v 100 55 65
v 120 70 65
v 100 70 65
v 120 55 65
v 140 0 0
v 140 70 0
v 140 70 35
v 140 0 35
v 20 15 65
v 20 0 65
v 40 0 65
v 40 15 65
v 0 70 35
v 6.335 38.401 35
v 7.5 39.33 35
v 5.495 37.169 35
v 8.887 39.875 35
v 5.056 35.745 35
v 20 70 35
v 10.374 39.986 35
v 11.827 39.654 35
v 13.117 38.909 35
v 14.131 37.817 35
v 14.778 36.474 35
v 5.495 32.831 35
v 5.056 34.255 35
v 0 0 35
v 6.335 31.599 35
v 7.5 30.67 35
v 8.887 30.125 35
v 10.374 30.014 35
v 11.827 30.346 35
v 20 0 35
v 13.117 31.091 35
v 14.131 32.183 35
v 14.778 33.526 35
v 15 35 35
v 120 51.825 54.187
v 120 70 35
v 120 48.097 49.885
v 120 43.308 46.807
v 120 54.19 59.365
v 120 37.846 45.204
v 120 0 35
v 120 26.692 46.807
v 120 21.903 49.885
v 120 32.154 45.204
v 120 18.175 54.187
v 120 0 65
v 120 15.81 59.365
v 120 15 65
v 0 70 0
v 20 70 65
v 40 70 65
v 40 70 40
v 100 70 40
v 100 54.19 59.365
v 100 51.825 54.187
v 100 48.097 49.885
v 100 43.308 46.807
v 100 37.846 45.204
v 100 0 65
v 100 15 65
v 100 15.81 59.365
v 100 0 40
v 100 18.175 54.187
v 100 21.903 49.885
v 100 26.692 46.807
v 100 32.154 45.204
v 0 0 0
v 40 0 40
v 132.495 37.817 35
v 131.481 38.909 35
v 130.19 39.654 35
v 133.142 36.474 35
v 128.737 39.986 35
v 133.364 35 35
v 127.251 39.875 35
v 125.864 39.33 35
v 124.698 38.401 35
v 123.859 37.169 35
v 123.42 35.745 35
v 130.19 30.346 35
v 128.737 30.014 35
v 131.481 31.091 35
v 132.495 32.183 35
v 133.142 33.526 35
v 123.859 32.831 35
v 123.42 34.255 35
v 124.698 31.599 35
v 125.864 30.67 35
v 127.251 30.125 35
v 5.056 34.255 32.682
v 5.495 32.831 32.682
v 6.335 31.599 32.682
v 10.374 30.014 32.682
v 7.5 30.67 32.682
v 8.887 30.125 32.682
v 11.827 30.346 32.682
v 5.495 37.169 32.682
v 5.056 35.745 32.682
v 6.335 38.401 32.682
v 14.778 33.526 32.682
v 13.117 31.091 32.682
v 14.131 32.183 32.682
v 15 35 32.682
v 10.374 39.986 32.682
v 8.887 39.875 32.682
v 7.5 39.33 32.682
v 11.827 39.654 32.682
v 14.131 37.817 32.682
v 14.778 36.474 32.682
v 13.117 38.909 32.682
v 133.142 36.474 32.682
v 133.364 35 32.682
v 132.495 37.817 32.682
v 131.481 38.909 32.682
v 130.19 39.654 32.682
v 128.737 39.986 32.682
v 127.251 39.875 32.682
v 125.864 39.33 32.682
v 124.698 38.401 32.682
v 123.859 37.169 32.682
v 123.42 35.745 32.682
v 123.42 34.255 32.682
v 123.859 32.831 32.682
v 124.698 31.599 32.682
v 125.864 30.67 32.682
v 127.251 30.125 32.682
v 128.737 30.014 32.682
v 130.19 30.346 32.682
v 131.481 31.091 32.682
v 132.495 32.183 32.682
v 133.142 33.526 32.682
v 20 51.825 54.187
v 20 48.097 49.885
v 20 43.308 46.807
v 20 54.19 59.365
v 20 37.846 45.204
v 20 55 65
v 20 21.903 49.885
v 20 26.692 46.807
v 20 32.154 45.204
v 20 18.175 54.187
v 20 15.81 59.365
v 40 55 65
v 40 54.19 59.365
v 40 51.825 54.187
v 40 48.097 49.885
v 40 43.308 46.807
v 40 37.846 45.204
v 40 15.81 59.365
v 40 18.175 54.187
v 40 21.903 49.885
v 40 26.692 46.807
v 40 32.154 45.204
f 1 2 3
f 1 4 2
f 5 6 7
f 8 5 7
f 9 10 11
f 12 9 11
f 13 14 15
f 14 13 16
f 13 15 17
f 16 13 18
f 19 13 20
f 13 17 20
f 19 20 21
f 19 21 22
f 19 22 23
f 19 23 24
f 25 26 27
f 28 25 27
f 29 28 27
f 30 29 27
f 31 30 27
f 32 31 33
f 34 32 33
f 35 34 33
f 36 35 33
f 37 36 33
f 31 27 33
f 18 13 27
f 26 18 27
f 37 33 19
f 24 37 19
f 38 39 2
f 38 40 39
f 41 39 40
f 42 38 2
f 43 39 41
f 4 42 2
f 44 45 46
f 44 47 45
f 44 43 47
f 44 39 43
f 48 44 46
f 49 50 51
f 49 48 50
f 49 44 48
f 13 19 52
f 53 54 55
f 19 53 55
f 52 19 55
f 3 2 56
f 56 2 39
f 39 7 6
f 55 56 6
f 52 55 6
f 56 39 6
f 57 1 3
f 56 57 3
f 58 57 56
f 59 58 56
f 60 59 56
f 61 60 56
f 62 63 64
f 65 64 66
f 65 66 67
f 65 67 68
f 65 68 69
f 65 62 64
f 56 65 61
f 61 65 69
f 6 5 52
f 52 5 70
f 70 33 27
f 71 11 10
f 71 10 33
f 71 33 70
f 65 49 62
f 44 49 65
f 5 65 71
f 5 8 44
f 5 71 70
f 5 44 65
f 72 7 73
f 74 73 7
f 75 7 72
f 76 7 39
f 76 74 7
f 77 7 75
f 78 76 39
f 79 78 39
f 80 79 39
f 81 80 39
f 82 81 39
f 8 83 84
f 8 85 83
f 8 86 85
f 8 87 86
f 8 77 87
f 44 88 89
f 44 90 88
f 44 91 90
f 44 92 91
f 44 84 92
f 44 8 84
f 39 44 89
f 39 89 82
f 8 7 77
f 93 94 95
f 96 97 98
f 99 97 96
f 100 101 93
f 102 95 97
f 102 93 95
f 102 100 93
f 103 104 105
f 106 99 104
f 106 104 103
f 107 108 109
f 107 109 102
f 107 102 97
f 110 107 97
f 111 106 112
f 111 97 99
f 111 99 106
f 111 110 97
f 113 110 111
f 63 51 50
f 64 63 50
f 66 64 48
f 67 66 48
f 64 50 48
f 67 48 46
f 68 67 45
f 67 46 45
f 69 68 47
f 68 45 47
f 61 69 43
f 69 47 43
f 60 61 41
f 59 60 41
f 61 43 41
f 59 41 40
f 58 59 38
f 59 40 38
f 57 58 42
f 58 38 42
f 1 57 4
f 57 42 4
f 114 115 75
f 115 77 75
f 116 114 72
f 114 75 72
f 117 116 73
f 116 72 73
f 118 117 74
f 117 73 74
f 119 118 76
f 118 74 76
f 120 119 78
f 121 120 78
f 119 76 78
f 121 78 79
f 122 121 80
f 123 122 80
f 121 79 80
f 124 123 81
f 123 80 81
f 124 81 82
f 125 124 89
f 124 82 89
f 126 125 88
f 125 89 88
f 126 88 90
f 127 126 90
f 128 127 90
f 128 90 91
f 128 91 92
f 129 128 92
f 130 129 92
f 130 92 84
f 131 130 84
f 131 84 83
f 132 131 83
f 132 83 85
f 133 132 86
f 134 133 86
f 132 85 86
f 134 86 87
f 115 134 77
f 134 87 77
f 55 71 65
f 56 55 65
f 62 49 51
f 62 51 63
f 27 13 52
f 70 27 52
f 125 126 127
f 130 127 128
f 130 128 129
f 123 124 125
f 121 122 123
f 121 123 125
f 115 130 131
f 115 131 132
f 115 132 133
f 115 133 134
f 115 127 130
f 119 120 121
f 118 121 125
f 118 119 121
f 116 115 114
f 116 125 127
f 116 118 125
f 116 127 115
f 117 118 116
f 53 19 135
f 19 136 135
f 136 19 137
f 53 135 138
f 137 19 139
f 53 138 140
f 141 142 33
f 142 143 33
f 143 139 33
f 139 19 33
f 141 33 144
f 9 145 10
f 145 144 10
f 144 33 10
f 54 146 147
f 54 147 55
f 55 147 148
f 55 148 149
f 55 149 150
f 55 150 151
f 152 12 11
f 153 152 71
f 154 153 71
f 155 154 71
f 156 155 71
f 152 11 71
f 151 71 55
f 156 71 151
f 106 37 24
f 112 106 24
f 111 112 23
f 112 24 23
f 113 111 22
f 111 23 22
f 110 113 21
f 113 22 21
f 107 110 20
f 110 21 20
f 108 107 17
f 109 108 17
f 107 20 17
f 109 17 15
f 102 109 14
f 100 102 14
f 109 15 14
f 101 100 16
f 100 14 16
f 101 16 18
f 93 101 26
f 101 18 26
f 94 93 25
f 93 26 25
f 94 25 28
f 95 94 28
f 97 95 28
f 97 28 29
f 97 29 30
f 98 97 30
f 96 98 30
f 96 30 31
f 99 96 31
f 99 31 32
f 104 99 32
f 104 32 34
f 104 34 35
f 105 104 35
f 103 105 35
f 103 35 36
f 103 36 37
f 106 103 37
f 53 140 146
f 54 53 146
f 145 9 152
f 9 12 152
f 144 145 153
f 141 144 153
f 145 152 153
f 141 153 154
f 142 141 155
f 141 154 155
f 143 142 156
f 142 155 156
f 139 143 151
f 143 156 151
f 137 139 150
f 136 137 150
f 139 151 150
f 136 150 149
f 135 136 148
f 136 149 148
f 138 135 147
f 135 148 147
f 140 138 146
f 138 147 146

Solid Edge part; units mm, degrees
sketch "Sketch1" plane through (0, 0, 0) normal (0, -1, 0) x (1, 0, 0)
  line L0 (140, 0) -> (140, 35)
  line L1 (140, 35) -> (120, 35)
  line L2 (120, 35) -> (120, 65)
  line L3 (120, 65) -> (100, 65)
  line L4 (100, 65) -> (100, 40)
  line L5 (40, 40) -> (100, 40)
  line L6 (40, 65) -> (40, 40)
  line L7 (20, 65) -> (40, 65)
  line L8 (20, 35) -> (20, 65)
  line L9 (0, 35) -> (20, 35)
  line L10 (0, 35) -> (0, 0)
  line L11 (140, 0) -> (0, 0)
extrude "Protrusion1" add sketch "Sketch1" against normal blind 70
sketch "Sketch2" plane through (120, 35, 50) normal (1, 0, 0) x (0, 1, 0)
  circle A0 centre (0, 15) radius 20
extrude "ExtrudedCutout_1" cut sketch "Sketch2" against normal blind 180.6982
sketch "Sketch3" plane through (130, 35, 35) normal (0, 0, 1) x (1, 0, 0)
  circle A0 centre (-1.6363, 0) radius 5
  circle A1 centre (-120, 0) radius 5
extrude "ExtrudedCutout_2" cut sketch "Sketch3" against normal blind 2.3183
